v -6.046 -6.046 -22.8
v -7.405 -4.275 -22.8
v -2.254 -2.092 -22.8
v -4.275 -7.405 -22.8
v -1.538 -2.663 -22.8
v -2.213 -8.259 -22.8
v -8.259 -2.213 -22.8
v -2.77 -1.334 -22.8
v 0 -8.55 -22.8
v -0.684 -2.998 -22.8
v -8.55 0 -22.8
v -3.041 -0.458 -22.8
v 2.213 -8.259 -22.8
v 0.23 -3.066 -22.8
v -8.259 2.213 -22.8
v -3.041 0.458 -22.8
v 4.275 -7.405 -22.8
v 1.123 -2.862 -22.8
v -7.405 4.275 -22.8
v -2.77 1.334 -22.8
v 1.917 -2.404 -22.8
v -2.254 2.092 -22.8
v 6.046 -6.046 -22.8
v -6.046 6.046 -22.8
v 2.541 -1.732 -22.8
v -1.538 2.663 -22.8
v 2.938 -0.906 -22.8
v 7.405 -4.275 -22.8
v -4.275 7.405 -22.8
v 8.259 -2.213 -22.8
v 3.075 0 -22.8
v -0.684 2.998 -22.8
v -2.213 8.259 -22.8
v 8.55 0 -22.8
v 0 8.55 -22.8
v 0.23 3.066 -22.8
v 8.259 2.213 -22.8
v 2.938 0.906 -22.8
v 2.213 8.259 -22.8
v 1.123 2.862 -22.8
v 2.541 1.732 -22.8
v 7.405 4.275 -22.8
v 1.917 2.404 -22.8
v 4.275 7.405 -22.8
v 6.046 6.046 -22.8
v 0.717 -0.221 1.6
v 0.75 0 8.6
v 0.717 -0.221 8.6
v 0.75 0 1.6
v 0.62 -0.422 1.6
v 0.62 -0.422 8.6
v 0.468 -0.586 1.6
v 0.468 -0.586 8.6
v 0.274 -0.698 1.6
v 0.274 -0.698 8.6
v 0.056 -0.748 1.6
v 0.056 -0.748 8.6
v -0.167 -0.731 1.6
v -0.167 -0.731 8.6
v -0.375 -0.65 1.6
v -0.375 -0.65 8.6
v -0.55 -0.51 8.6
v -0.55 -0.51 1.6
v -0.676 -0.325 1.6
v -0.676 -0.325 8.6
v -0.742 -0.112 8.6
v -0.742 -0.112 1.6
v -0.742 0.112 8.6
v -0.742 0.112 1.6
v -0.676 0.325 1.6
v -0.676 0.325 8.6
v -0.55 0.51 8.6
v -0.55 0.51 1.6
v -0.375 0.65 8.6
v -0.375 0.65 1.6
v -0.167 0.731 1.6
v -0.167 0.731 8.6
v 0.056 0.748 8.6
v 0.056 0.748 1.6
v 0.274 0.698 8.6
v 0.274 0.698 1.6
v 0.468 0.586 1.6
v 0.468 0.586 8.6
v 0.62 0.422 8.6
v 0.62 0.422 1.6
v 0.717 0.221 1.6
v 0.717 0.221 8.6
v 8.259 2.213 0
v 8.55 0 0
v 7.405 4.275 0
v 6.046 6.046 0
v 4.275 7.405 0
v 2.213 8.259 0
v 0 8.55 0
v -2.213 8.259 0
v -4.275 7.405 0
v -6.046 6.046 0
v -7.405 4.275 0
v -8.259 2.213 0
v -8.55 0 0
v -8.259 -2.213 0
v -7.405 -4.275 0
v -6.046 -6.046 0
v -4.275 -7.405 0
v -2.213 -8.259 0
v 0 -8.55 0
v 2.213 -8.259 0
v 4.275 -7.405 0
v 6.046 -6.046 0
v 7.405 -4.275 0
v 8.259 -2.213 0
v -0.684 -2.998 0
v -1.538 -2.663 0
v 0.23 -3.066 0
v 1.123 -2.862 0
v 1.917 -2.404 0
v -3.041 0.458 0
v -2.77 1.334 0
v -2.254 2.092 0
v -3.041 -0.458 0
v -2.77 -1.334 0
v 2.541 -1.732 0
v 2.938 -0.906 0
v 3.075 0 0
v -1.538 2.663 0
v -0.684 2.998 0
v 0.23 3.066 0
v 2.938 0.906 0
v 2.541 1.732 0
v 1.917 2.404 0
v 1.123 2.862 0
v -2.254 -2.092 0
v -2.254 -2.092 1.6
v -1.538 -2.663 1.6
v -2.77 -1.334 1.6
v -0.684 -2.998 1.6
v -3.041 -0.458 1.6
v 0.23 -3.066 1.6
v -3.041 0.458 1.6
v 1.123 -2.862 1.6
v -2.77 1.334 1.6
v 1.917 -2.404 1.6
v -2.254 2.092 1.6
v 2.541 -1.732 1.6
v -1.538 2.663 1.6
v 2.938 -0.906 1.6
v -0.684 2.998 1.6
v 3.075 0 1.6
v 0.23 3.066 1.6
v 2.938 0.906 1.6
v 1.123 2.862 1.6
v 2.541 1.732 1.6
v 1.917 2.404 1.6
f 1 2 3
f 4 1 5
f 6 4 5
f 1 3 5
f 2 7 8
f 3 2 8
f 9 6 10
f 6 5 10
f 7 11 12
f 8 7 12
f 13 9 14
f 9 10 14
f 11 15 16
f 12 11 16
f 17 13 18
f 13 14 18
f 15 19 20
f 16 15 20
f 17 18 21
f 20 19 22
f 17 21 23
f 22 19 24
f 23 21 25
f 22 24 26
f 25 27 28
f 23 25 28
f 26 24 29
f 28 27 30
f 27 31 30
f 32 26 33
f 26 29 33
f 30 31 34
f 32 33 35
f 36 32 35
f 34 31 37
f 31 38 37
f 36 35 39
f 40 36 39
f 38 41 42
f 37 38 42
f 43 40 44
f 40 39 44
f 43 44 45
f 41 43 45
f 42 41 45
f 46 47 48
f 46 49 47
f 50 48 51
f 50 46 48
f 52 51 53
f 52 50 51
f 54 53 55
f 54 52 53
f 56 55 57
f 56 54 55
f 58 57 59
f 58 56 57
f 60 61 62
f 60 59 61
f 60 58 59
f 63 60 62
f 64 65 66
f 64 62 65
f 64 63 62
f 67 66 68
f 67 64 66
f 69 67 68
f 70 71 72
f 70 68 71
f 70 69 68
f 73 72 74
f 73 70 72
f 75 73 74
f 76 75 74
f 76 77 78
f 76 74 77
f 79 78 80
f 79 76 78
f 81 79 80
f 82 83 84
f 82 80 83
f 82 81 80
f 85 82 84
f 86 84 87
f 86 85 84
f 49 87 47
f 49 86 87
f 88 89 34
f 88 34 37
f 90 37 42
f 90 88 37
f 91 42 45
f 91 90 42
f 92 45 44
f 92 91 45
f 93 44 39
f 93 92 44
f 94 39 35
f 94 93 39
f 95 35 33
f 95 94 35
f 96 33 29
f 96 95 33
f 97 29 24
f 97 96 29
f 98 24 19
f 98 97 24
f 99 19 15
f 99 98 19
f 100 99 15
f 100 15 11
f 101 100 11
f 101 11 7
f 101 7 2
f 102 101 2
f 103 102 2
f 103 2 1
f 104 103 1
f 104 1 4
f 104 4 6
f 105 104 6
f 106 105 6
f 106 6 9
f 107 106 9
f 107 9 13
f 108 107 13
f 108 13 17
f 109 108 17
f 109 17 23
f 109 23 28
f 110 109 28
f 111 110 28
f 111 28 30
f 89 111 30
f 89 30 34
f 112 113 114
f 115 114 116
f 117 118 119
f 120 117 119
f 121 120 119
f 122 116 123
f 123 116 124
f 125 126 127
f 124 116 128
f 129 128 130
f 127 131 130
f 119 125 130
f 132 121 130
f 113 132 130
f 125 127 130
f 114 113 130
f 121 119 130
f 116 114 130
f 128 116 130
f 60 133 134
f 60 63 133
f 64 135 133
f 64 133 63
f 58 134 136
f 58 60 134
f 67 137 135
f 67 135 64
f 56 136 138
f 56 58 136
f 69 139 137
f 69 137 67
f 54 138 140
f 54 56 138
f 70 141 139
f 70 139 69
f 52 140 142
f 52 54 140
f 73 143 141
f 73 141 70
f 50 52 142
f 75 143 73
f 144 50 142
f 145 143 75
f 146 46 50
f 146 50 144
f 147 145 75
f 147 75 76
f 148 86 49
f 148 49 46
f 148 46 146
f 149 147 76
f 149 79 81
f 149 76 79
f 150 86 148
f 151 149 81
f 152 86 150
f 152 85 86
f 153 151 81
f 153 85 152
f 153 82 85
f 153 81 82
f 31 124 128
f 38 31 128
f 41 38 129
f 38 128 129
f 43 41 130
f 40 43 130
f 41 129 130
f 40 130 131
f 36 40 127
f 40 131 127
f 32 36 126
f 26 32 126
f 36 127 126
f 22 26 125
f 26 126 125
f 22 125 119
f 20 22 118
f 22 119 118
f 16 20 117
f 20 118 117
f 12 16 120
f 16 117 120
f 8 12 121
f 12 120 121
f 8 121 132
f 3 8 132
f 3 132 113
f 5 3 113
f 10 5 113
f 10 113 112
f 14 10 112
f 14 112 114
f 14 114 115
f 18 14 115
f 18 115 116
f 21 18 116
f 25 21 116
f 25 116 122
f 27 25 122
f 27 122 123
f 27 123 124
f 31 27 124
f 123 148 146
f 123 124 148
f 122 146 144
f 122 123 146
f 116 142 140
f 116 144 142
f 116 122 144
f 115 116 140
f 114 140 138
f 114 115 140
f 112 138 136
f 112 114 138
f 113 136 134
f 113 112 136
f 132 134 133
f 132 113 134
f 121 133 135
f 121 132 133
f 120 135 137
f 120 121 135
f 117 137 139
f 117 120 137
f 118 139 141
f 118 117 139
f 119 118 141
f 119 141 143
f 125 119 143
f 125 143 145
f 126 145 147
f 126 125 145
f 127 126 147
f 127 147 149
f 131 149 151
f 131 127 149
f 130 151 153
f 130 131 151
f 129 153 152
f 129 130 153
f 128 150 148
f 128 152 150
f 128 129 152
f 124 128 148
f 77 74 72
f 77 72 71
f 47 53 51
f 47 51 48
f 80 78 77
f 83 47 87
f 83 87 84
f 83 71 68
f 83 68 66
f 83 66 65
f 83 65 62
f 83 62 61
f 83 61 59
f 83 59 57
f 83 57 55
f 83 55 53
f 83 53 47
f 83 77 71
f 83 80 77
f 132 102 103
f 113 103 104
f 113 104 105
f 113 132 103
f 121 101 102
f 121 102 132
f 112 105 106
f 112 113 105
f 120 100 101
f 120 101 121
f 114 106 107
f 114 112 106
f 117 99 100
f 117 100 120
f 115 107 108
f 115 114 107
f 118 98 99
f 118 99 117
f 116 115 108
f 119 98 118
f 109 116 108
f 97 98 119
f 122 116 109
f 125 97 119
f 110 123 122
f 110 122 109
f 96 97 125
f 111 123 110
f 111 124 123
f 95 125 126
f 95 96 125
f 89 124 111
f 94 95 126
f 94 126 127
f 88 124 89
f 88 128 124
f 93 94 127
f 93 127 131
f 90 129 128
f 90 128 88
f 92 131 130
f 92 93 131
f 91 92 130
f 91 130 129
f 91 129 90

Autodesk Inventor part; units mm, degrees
ref_plane "YZ Plane" through (0, 0, 0) normal (1, 0, 0) x (0, 1, 0)
ref_plane "XZ Plane" through (0, 0, 0) normal (0, 1, 0) x (-1, 0, 0)
ref_plane "XY Plane" through (0, 0, 0) normal (0, 0, 1) x (1, 0, 0)
sketch "Sketch1" plane through (0, 0, 0) normal (0, 0, 1) x (1, 0, 0)
  circle A0 centre (0, 0) radius 8.55
  circle A1 centre (0, 0) radius 3.075
  circle A2 centre (0, 0) radius 0.75
  dimension "d0" = 17.1
  dimension "d1" = 6.15
  dimension "d2" = 1.5
extrude "Extrusion1" add sketch "Sketch1" against normal blind 22.8 contours A0
extrude "Extrusion2" add sketch "Sketch1" along normal blind 1.6 contours A1
extrude "Extrusion3" add sketch "Sketch1" along normal blind 8.6 contours A2
properties part number "motor kipas"
